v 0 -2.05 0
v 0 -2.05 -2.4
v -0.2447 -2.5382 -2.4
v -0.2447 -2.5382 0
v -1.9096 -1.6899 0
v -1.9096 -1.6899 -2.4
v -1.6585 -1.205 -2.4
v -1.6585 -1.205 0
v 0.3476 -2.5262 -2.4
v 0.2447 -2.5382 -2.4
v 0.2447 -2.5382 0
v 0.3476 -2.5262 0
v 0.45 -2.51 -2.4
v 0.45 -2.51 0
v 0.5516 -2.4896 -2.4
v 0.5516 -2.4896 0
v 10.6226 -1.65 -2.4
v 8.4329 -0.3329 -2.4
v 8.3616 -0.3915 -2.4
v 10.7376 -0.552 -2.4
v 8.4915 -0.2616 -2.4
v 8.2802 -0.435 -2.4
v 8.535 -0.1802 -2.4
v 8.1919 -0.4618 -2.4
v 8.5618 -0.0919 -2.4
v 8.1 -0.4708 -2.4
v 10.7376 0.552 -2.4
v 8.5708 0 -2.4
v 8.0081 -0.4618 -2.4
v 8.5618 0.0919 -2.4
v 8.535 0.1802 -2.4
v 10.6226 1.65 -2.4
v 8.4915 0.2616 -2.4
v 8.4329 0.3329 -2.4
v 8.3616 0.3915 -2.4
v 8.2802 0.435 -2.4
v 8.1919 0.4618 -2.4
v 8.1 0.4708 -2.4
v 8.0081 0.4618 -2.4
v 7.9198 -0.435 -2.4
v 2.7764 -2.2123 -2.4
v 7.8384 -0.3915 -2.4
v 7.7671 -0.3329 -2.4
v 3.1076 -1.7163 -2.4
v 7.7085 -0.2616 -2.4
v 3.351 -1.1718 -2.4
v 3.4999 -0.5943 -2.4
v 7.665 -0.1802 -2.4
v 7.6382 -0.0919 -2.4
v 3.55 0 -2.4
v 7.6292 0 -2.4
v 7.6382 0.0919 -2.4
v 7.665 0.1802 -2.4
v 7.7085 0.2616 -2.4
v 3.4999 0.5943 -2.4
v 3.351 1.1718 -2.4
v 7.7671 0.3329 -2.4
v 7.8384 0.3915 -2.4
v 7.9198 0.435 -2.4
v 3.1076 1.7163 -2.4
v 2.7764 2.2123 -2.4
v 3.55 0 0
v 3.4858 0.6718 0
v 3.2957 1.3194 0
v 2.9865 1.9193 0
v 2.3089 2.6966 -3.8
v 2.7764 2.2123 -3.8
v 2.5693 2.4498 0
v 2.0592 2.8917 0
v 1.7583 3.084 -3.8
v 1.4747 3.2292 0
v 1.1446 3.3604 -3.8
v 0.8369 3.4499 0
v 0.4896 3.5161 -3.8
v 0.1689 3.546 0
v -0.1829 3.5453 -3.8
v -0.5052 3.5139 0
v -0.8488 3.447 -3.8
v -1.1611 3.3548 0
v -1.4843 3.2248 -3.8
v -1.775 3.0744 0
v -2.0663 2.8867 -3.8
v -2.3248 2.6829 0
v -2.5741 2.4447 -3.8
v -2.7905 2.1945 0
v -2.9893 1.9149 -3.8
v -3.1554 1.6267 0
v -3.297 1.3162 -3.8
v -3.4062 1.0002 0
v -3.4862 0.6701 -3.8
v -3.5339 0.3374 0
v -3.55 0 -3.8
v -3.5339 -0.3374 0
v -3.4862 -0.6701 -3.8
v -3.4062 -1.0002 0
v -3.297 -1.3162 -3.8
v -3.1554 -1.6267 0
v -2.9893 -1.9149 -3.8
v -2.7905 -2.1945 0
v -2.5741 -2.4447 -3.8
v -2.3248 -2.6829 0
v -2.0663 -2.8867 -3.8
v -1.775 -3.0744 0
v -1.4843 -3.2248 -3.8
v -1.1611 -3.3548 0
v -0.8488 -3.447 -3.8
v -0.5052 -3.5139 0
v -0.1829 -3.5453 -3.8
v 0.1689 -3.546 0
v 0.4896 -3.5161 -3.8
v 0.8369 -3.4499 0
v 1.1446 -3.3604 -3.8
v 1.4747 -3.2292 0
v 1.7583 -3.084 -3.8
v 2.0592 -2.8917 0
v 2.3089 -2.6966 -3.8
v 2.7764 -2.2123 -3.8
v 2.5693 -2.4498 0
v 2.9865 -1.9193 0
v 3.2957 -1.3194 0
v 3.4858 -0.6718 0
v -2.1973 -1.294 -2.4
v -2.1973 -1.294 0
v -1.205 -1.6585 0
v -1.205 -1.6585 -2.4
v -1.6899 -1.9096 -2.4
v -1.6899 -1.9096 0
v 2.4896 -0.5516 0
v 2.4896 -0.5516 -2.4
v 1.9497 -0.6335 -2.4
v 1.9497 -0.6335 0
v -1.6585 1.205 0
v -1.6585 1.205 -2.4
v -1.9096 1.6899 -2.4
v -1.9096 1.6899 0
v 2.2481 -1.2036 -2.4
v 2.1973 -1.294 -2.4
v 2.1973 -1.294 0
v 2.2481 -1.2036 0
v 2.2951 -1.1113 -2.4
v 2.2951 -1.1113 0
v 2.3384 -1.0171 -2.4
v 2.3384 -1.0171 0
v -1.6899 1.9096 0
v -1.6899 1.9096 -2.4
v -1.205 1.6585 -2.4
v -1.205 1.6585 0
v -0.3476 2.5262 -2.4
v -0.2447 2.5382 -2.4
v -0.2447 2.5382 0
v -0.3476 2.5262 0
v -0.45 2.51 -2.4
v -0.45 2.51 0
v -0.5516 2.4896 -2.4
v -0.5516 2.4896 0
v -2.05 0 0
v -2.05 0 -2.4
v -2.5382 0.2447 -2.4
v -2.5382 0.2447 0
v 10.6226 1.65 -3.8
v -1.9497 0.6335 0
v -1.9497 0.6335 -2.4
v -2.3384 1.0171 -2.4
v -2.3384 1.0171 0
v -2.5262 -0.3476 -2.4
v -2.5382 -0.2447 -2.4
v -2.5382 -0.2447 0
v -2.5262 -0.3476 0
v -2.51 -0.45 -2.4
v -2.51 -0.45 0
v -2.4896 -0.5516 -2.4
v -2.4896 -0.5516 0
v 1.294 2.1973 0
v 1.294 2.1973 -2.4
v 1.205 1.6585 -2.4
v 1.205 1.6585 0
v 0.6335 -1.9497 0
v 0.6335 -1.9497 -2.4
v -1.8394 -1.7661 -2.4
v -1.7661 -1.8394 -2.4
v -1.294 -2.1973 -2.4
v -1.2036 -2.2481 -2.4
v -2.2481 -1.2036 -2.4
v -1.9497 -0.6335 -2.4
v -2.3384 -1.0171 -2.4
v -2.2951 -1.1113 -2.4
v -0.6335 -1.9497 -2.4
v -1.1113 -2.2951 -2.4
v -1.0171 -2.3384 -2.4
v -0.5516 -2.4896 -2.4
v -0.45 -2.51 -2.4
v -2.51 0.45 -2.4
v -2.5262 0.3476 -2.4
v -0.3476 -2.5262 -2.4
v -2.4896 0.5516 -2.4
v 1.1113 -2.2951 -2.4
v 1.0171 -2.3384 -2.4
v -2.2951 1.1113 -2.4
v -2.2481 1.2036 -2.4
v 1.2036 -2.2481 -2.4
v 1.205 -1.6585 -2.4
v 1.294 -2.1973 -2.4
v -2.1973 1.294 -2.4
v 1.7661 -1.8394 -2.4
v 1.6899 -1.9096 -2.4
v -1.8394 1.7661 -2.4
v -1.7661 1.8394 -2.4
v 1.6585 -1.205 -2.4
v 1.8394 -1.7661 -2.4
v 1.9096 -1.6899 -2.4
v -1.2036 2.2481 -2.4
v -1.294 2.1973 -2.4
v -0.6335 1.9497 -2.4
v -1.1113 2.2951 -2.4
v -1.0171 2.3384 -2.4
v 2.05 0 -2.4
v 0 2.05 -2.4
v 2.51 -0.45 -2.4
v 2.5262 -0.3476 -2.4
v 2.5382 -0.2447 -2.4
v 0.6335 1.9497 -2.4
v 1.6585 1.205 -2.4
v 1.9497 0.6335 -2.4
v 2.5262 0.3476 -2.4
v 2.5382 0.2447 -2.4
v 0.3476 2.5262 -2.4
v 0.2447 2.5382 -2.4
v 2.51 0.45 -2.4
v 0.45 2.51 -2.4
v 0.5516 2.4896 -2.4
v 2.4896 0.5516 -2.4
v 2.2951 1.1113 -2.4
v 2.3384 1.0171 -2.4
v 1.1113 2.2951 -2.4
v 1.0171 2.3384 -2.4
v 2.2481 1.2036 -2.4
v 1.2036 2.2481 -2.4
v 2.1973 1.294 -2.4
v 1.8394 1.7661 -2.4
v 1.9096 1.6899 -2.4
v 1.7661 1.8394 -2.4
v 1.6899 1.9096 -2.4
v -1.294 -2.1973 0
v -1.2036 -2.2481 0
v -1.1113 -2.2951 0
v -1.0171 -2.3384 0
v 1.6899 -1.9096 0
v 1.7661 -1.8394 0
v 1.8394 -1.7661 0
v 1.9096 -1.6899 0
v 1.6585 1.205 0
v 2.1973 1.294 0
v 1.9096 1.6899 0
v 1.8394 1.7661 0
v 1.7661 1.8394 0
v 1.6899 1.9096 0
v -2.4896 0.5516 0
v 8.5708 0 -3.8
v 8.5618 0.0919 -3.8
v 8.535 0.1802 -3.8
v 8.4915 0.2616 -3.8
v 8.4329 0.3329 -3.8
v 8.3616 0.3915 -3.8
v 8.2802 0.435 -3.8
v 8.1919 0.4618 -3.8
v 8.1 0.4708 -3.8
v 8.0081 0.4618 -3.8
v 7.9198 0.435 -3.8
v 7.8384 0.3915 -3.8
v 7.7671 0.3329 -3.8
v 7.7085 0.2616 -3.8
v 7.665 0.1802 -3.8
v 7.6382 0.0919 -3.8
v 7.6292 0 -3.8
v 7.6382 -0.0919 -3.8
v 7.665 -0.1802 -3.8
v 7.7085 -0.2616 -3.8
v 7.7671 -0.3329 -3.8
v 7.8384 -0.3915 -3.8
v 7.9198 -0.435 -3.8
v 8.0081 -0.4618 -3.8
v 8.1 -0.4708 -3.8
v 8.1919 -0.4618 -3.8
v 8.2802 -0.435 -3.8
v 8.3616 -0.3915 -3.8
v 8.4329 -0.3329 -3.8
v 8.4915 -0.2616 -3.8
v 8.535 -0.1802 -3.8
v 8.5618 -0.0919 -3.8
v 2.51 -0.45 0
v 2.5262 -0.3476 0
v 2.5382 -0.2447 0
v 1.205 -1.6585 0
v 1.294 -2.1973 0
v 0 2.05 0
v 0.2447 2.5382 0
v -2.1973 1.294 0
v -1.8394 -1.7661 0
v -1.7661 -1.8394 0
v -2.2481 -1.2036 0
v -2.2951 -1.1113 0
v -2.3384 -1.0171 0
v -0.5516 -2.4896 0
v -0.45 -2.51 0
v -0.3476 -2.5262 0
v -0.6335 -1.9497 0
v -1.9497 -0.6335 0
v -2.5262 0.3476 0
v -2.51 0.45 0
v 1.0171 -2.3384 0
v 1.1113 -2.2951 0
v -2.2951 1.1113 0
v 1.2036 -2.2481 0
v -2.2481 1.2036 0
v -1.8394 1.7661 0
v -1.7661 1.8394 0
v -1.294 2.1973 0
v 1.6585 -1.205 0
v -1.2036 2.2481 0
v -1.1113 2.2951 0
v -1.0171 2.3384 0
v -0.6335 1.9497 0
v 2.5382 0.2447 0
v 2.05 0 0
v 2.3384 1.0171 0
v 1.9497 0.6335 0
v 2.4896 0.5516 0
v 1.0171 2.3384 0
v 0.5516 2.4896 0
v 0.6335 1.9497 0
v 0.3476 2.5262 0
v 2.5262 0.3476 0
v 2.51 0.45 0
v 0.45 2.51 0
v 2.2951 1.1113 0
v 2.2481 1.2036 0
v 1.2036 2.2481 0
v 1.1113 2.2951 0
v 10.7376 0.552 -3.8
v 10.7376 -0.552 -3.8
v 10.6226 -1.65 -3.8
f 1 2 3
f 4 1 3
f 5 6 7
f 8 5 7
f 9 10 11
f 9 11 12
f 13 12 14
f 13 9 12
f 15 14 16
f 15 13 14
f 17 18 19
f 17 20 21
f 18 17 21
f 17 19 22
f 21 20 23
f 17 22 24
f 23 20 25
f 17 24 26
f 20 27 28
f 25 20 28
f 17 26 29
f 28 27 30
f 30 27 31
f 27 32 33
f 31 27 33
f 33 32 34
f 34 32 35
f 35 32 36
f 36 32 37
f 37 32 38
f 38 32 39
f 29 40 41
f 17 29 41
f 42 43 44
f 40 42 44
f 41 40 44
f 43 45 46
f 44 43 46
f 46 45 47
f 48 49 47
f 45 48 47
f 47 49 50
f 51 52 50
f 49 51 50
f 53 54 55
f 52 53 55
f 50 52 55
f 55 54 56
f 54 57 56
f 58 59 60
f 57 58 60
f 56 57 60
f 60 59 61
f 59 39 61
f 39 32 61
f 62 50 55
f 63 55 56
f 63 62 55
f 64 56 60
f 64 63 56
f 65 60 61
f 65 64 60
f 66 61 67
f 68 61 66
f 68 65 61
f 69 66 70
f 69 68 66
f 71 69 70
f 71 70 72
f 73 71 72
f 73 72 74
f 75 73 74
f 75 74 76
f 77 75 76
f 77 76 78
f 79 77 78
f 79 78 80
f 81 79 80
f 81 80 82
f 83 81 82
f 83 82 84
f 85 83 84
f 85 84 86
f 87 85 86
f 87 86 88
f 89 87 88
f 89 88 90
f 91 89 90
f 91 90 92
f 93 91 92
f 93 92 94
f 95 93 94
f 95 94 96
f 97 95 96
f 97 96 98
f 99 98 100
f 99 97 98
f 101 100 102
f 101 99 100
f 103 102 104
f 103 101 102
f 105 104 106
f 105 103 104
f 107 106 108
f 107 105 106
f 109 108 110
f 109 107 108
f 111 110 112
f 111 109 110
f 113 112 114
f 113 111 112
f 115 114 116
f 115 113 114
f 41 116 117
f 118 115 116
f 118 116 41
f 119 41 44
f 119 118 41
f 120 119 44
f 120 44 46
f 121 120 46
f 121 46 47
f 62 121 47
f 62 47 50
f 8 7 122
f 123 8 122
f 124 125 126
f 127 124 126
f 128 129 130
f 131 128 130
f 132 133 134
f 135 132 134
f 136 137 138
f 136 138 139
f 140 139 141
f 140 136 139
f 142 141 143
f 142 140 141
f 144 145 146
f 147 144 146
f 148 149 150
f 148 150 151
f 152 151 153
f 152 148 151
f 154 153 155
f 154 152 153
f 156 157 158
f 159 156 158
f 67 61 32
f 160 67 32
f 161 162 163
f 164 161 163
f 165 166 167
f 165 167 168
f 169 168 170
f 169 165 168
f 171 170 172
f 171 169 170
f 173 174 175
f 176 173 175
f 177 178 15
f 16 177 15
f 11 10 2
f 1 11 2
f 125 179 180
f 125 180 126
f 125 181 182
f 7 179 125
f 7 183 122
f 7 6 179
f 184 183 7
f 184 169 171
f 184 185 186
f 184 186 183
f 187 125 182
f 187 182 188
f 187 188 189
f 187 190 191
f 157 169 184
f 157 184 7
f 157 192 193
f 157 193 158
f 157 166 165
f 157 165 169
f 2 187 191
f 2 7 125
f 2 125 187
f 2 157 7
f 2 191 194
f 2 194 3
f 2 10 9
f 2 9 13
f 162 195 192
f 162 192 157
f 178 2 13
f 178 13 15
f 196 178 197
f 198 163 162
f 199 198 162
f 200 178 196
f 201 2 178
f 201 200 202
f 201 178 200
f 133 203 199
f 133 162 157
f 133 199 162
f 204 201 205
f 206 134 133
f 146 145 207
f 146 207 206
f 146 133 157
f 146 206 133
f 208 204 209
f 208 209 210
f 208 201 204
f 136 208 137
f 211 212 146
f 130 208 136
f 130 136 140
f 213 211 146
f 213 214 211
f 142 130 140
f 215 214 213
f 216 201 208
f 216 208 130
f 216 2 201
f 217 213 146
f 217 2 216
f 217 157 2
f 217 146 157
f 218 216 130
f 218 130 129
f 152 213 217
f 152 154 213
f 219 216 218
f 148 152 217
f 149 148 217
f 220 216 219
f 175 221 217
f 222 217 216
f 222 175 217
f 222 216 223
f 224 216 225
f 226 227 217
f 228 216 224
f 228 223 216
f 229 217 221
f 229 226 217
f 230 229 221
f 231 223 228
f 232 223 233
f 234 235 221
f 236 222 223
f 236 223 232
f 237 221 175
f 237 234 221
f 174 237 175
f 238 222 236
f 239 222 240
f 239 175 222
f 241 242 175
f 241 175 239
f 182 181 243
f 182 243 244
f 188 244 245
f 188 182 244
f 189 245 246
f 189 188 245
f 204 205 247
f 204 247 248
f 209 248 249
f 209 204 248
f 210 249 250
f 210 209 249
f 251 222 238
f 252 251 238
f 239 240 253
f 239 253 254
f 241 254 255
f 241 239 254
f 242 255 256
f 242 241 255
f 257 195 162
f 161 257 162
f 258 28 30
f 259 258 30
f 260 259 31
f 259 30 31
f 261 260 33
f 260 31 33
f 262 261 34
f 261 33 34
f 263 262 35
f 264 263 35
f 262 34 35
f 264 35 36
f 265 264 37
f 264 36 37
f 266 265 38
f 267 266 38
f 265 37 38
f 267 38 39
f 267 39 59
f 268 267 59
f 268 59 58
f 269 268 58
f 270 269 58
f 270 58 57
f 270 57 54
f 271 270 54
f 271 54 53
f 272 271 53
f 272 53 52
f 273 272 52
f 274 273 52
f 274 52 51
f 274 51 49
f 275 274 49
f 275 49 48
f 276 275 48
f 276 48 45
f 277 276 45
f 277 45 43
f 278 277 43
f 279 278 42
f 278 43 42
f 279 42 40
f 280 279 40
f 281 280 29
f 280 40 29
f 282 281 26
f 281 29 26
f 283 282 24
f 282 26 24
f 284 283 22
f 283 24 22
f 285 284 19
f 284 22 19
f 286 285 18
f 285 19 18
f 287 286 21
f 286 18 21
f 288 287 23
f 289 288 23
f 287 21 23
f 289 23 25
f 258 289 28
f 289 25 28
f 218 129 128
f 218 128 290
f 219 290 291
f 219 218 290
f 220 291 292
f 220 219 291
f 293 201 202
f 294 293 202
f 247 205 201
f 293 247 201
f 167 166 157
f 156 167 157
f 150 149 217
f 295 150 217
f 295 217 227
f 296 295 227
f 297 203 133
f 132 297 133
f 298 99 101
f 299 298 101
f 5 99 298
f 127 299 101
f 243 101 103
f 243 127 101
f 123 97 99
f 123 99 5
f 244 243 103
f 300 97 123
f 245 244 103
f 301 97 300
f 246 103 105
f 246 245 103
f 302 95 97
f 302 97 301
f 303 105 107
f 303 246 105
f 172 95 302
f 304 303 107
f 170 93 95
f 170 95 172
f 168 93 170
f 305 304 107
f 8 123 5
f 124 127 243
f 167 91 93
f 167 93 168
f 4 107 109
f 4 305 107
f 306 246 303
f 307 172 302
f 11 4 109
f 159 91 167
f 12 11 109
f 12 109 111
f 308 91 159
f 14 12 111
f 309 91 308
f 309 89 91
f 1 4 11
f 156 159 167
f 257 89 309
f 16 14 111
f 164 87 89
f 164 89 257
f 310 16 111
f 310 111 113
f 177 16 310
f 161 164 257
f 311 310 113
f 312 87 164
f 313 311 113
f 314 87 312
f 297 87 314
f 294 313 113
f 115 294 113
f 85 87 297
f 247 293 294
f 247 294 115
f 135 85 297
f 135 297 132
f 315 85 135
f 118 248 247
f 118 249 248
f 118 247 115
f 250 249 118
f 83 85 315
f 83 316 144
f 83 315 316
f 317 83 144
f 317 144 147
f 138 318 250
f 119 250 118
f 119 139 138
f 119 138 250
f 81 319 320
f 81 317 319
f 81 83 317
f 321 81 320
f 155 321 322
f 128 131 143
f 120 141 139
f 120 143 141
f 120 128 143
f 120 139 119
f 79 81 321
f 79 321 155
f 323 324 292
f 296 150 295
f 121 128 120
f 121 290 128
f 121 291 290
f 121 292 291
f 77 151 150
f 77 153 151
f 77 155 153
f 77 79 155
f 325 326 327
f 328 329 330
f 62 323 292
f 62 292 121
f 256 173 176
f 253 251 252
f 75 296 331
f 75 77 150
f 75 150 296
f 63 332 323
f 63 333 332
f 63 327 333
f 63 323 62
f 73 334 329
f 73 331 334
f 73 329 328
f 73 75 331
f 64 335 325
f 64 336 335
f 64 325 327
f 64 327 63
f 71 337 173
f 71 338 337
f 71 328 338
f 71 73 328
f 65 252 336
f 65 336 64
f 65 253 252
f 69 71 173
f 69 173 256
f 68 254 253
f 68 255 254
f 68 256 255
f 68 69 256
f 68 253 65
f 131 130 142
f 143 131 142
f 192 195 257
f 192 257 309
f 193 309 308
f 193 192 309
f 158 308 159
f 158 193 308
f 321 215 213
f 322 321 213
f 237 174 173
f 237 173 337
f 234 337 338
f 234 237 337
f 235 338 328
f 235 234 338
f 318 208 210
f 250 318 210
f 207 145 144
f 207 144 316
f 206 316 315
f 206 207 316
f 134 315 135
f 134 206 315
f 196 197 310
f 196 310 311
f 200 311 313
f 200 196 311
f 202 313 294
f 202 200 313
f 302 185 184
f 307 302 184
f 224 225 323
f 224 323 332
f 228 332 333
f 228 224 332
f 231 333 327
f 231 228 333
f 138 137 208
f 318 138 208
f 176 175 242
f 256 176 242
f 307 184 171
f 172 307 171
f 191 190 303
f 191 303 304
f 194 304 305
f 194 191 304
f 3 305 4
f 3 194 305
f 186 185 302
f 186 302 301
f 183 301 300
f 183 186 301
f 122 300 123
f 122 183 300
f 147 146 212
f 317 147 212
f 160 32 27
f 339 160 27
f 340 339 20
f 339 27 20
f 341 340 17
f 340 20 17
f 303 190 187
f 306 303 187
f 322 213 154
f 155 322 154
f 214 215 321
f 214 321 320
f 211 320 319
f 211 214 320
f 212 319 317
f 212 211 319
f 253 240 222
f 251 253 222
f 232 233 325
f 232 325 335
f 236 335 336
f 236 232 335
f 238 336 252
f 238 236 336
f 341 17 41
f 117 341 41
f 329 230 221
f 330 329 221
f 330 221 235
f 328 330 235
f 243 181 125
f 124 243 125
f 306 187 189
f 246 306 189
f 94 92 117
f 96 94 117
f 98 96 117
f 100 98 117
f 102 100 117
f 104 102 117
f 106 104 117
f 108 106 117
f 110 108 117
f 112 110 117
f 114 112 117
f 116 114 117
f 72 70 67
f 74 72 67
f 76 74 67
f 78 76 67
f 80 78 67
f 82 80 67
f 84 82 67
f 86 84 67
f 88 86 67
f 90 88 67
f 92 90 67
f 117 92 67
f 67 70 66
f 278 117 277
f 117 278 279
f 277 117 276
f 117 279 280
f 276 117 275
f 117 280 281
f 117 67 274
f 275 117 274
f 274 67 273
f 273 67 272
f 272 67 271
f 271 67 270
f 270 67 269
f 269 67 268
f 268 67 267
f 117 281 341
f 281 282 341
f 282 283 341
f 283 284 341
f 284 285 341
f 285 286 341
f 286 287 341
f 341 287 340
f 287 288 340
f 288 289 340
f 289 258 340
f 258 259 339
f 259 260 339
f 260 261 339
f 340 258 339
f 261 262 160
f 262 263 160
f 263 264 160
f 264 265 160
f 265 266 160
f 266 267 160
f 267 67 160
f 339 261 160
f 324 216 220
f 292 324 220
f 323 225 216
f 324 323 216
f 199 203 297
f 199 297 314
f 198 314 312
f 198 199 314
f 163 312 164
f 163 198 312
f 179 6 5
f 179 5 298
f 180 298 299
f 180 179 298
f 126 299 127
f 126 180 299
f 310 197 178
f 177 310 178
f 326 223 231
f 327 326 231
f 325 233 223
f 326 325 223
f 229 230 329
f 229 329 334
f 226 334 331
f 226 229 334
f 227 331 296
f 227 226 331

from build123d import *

# Parameters (mm, degrees)
BOSS_EXTRUDE2_DEPTH = 1.4
SKETCH6_R           = 0.47083328
CUT_EXTRUDE1_DEPTH  = 12.066142252
SKETCH8_R           = 3.549999952
BOSS_EXTRUDE3_DEPTH = 3.8
CUT_EXTRUDE2_START  = -2.4
SKETCH9_R           = 2.549999919
CUT_EXTRUDE2_DEPTH  = 2.4
BOSS_EXTRUDE4_START = -2.4
BOSS_EXTRUDE4_DEPTH = 2.4


with BuildPart() as part:
    # Sketch5 → Boss-Extrude2 (new body)
    with BuildSketch(Plane.XY.offset(-2.4)):
        with BuildLine():
            Line((2.776387215, 2.212277889), (10.622617722, 1.649999976))
            ThreePointArc((10.622617722, 1.649999976), (10.75199195, 0), (10.622617722, -1.649999976))
            Line((10.622617722, -1.649999976), (2.776387215, -2.212277889))
            ThreePointArc((2.776387215, -2.212277889), (3.549999952, 0), (2.776387215, 2.212277889))
        make_face()
    extrude(amount=-BOSS_EXTRUDE2_DEPTH)

    # Sketch6 → Cut-Extrude1 (cut, through all)
    with BuildSketch(Plane.XY.offset(-2.4)):
        with Locations((8.100000381, 0)):
            Circle(SKETCH6_R)
    extrude(amount=-CUT_EXTRUDE1_DEPTH, mode=Mode.SUBTRACT)

    # Sketch8 → Boss-Extrude3 (add)
    with BuildSketch(Plane.XY):
        Circle(SKETCH8_R)
    extrude(amount=-BOSS_EXTRUDE3_DEPTH)

    # Sketch9 → Cut-Extrude2 (cut)
    with BuildSketch(Plane.XY.offset(CUT_EXTRUDE2_START)):
        Circle(SKETCH9_R)
    extrude(amount=CUT_EXTRUDE2_DEPTH, mode=Mode.SUBTRACT)

    # Sketch7 → Boss-Extrude4 (add)
    with BuildSketch(Plane.XY.offset(BOSS_EXTRUDE4_START)):
        with BuildLine():
            Line((-0.244697916, 2.538232164), (0, 2.049999952))
            Line((0, 2.049999952), (0.244697916, 2.538232164))
            ThreePointArc((0.244697916, 2.538232164), (0, 2.549999919), (-0.244697916, 2.538232164))
        make_face()
        with BuildLine():
            Line((0.551635326, 2.489618054), (0.633484824, 1.949665813))
            Line((0.633484824, 1.949665813), (1.017078422, 2.338386424))
            ThreePointArc((1.017078422, 2.338386424), (0.787993311, 2.42519404), (0.551635326, 2.489618054))
        make_face()
        with BuildLine():
            Line((1.29397066, 2.197302783), (1.204959739, 1.6584848))
            Line((1.204959739, 1.6584848), (1.689900206, 1.90964313))
            ThreePointArc((1.689900206, 1.90964313), (1.498852346, 2.06299327), (1.29397066, 2.197302783))
        make_face()
        with BuildLine():
            Line((1.90964313, 1.689900206), (1.6584848, 1.204959739))
            Line((1.6584848, 1.204959739), (2.197302783, 1.29397066))
            ThreePointArc((2.197302783, 1.29397066), (2.06299327, 1.498852346), (1.90964313, 1.689900206))
        make_face()
        with BuildLine():
            Line((2.338386424, 1.017078422), (1.949665813, 0.633484824))
            Line((1.949665813, 0.633484824), (2.489618054, 0.551635326))
            ThreePointArc((2.489618054, 0.551635326), (2.42519404, 0.787993311), (2.338386424, 1.017078422))
        make_face()
        with BuildLine():
            Line((2.538232164, 0.244697916), (2.049999952, 0))
            Line((2.049999952, 0), (2.538232164, -0.244697916))
            ThreePointArc((2.538232164, -0.244697916), (2.549999919, 0), (2.538232164, 0.244697916))
        make_face()
        with BuildLine():
            Line((2.489618054, -0.551635326), (1.949665813, -0.633484824))
            Line((1.949665813, -0.633484824), (2.338386424, -1.017078422))
            ThreePointArc((2.338386424, -1.017078422), (2.42519404, -0.787993311), (2.489618054, -0.551635326))
        make_face()
        with BuildLine():
            Line((2.197302783, -1.29397066), (1.6584848, -1.204959739))
            Line((1.6584848, -1.204959739), (1.90964313, -1.689900206))
            ThreePointArc((1.90964313, -1.689900206), (2.06299327, -1.498852346), (2.197302783, -1.29397066))
        make_face()
        with BuildLine():
            Line((1.689900206, -1.90964313), (1.204959739, -1.6584848))
            Line((1.204959739, -1.6584848), (1.29397066, -2.197302783))
            ThreePointArc((1.29397066, -2.197302783), (1.498852346, -2.06299327), (1.689900206, -1.90964313))
        make_face()
        with BuildLine():
            Line((1.017078422, -2.338386424), (0.633484824, -1.949665813))
            Line((0.633484824, -1.949665813), (0.551635326, -2.489618054))
            ThreePointArc((0.551635326, -2.489618054), (0.787993311, -2.42519404), (1.017078422, -2.338386424))
        make_face()
        with BuildLine():
            Line((0.244697916, -2.538232164), (0, -2.049999952))
            Line((0, -2.049999952), (-0.244697916, -2.538232164))
            ThreePointArc((-0.244697916, -2.538232164), (0, -2.549999919), (0.244697916, -2.538232164))
        make_face()
        with BuildLine():
            Line((-0.551635326, -2.489618054), (-0.633484824, -1.949665813))
            Line((-0.633484824, -1.949665813), (-1.017078422, -2.338386424))
            ThreePointArc((-1.017078422, -2.338386424), (-0.787993311, -2.42519404), (-0.551635326, -2.489618054))
        make_face()
        with BuildLine():
            Line((-1.29397066, -2.197302783), (-1.204959739, -1.6584848))
            Line((-1.204959739, -1.6584848), (-1.689900206, -1.90964313))
            ThreePointArc((-1.689900206, -1.90964313), (-1.498852346, -2.06299327), (-1.29397066, -2.197302783))
        make_face()
        with BuildLine():
            Line((-1.90964313, -1.689900206), (-1.6584848, -1.204959739))
            Line((-1.6584848, -1.204959739), (-2.197302783, -1.29397066))
            ThreePointArc((-2.197302783, -1.29397066), (-2.06299327, -1.498852346), (-1.90964313, -1.689900206))
        make_face()
        with BuildLine():
            Line((-2.338386424, -1.017078422), (-1.949665813, -0.633484824))
            Line((-1.949665813, -0.633484824), (-2.489618054, -0.551635326))
            ThreePointArc((-2.489618054, -0.551635326), (-2.42519404, -0.787993311), (-2.338386424, -1.017078422))
        make_face()
        with BuildLine():
            Line((-2.538232164, -0.244697916), (-2.049999952, 0))
            Line((-2.049999952, 0), (-2.538232164, 0.244697916))
            ThreePointArc((-2.538232164, 0.244697916), (-2.549999919, 0), (-2.538232164, -0.244697916))
        make_face()
        with BuildLine():
            Line((-2.489618054, 0.551635326), (-1.949665813, 0.633484824))
            Line((-1.949665813, 0.633484824), (-2.338386424, 1.017078422))
            ThreePointArc((-2.338386424, 1.017078422), (-2.42519404, 0.787993311), (-2.489618054, 0.551635326))
        make_face()
        with BuildLine():
            Line((-2.197302783, 1.29397066), (-1.6584848, 1.204959739))
            Line((-1.6584848, 1.204959739), (-1.90964313, 1.689900206))
            ThreePointArc((-1.90964313, 1.689900206), (-2.06299327, 1.498852346), (-2.197302783, 1.29397066))
        make_face()
        with BuildLine():
            Line((-1.689900206, 1.90964313), (-1.204959739, 1.6584848))
            Line((-1.204959739, 1.6584848), (-1.29397066, 2.197302783))
            ThreePointArc((-1.29397066, 2.197302783), (-1.498852346, 2.06299327), (-1.689900206, 1.90964313))
        make_face()
        with BuildLine():
            Line((-1.017078422, 2.338386424), (-0.633484824, 1.949665813))
            Line((-0.633484824, 1.949665813), (-0.551635326, 2.489618054))
            ThreePointArc((-0.551635326, 2.489618054), (-0.787993311, 2.42519404), (-1.017078422, 2.338386424))
        make_face()
    extrude(amount=BOSS_EXTRUDE4_DEPTH)


solid = part.part
